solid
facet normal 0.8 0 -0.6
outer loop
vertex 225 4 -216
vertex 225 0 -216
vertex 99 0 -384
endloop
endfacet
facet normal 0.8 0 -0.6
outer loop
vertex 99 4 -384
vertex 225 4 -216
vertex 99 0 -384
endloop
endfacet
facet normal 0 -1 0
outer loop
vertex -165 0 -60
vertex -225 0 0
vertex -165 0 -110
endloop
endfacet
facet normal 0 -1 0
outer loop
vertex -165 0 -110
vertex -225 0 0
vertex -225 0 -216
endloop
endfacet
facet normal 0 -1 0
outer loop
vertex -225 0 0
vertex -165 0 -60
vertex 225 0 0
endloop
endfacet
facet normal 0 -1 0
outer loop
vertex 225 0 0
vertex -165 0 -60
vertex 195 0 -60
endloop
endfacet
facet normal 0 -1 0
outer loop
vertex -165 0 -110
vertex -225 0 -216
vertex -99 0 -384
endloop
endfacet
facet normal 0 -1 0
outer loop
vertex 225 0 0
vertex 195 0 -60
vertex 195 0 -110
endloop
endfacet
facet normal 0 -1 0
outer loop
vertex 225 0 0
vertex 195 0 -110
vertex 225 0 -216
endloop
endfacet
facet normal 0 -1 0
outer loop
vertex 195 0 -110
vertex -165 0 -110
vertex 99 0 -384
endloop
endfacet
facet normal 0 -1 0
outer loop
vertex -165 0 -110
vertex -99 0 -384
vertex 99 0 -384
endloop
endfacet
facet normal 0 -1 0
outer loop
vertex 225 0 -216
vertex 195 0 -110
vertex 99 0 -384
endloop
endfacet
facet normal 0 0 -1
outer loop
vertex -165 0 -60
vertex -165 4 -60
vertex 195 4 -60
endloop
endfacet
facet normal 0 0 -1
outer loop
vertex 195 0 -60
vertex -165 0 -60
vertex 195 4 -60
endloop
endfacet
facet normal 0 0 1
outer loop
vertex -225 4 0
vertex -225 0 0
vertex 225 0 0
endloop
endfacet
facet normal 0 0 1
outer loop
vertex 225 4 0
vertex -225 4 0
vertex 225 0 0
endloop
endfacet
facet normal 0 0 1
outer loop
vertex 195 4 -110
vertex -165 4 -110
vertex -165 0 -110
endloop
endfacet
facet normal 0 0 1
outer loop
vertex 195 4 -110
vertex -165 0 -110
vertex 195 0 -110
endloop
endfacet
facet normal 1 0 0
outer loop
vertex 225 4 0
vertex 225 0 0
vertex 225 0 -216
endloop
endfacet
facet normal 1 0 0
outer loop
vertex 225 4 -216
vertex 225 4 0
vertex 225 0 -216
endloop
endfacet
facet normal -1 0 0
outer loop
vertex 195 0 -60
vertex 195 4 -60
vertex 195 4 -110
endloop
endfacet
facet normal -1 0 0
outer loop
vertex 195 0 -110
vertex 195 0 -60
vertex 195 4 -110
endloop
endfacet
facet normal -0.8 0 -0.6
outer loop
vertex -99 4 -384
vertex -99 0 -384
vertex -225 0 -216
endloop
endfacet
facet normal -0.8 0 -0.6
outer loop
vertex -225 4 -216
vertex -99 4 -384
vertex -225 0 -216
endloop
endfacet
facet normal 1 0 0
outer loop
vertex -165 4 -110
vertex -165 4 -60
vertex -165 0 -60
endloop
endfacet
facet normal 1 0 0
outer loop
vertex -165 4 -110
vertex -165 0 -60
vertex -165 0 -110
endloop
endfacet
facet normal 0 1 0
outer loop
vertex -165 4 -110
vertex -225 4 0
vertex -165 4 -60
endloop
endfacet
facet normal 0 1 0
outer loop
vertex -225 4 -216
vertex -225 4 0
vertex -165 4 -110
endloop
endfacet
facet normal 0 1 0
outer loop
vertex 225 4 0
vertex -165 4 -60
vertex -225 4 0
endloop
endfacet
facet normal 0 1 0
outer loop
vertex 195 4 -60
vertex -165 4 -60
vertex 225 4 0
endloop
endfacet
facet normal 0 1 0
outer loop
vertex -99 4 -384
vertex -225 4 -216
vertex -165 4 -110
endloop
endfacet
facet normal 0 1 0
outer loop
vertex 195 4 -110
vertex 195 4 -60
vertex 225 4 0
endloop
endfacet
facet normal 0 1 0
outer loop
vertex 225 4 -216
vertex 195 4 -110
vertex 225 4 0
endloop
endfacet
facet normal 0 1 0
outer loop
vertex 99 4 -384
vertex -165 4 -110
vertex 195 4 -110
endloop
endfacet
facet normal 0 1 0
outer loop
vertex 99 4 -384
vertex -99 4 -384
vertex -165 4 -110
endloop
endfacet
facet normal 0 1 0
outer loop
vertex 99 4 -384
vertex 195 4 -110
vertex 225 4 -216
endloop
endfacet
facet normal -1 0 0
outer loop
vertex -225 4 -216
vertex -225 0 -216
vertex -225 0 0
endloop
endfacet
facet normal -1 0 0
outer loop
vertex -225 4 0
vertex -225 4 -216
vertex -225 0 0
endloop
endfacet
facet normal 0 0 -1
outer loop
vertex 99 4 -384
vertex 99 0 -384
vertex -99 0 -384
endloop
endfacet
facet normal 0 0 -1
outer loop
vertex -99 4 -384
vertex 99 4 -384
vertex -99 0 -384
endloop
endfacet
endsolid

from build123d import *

# Parameters (mm, degrees)
EXTRUDE_1_DEPTH     = 4
CUT_EXTRUDE_1_REACH = 447.081
SKETCH_2_W          = 360
SKETCH_2_H          = 50


with BuildPart() as part:
    # 草图1 → 凸台-拉伸1 (new body)
    with BuildSketch(Plane(origin=(0, 0, 0), x_dir=(1, 0, 0), z_dir=(0, 1, 0))):
        Polygon((-225, 0), (225, 0), (225, 216), (99, 384), (-99, 384), (-225, 216), align=None)
    extrude(amount=EXTRUDE_1_DEPTH)

    # 草图2 → 切除-拉伸1 (cut, up to next)
    with BuildSketch(Plane(origin=(0, 4, 0), x_dir=(1, 0, 0), z_dir=(0, 1, 0)), mode=Mode.PRIVATE) as cut_extrude_1_sk1:
        with Locations((15, 85)):
            Rectangle(SKETCH_2_W, SKETCH_2_H)
    cut_extrude_1_tool1 = extrude(cut_extrude_1_sk1.sketch, amount=-CUT_EXTRUDE_1_REACH, mode=Mode.PRIVATE) & part.part
    add(cut_extrude_1_tool1.solids().sort_by_distance((15, 4, -85))[0], mode=Mode.SUBTRACT)


solid = part.part
